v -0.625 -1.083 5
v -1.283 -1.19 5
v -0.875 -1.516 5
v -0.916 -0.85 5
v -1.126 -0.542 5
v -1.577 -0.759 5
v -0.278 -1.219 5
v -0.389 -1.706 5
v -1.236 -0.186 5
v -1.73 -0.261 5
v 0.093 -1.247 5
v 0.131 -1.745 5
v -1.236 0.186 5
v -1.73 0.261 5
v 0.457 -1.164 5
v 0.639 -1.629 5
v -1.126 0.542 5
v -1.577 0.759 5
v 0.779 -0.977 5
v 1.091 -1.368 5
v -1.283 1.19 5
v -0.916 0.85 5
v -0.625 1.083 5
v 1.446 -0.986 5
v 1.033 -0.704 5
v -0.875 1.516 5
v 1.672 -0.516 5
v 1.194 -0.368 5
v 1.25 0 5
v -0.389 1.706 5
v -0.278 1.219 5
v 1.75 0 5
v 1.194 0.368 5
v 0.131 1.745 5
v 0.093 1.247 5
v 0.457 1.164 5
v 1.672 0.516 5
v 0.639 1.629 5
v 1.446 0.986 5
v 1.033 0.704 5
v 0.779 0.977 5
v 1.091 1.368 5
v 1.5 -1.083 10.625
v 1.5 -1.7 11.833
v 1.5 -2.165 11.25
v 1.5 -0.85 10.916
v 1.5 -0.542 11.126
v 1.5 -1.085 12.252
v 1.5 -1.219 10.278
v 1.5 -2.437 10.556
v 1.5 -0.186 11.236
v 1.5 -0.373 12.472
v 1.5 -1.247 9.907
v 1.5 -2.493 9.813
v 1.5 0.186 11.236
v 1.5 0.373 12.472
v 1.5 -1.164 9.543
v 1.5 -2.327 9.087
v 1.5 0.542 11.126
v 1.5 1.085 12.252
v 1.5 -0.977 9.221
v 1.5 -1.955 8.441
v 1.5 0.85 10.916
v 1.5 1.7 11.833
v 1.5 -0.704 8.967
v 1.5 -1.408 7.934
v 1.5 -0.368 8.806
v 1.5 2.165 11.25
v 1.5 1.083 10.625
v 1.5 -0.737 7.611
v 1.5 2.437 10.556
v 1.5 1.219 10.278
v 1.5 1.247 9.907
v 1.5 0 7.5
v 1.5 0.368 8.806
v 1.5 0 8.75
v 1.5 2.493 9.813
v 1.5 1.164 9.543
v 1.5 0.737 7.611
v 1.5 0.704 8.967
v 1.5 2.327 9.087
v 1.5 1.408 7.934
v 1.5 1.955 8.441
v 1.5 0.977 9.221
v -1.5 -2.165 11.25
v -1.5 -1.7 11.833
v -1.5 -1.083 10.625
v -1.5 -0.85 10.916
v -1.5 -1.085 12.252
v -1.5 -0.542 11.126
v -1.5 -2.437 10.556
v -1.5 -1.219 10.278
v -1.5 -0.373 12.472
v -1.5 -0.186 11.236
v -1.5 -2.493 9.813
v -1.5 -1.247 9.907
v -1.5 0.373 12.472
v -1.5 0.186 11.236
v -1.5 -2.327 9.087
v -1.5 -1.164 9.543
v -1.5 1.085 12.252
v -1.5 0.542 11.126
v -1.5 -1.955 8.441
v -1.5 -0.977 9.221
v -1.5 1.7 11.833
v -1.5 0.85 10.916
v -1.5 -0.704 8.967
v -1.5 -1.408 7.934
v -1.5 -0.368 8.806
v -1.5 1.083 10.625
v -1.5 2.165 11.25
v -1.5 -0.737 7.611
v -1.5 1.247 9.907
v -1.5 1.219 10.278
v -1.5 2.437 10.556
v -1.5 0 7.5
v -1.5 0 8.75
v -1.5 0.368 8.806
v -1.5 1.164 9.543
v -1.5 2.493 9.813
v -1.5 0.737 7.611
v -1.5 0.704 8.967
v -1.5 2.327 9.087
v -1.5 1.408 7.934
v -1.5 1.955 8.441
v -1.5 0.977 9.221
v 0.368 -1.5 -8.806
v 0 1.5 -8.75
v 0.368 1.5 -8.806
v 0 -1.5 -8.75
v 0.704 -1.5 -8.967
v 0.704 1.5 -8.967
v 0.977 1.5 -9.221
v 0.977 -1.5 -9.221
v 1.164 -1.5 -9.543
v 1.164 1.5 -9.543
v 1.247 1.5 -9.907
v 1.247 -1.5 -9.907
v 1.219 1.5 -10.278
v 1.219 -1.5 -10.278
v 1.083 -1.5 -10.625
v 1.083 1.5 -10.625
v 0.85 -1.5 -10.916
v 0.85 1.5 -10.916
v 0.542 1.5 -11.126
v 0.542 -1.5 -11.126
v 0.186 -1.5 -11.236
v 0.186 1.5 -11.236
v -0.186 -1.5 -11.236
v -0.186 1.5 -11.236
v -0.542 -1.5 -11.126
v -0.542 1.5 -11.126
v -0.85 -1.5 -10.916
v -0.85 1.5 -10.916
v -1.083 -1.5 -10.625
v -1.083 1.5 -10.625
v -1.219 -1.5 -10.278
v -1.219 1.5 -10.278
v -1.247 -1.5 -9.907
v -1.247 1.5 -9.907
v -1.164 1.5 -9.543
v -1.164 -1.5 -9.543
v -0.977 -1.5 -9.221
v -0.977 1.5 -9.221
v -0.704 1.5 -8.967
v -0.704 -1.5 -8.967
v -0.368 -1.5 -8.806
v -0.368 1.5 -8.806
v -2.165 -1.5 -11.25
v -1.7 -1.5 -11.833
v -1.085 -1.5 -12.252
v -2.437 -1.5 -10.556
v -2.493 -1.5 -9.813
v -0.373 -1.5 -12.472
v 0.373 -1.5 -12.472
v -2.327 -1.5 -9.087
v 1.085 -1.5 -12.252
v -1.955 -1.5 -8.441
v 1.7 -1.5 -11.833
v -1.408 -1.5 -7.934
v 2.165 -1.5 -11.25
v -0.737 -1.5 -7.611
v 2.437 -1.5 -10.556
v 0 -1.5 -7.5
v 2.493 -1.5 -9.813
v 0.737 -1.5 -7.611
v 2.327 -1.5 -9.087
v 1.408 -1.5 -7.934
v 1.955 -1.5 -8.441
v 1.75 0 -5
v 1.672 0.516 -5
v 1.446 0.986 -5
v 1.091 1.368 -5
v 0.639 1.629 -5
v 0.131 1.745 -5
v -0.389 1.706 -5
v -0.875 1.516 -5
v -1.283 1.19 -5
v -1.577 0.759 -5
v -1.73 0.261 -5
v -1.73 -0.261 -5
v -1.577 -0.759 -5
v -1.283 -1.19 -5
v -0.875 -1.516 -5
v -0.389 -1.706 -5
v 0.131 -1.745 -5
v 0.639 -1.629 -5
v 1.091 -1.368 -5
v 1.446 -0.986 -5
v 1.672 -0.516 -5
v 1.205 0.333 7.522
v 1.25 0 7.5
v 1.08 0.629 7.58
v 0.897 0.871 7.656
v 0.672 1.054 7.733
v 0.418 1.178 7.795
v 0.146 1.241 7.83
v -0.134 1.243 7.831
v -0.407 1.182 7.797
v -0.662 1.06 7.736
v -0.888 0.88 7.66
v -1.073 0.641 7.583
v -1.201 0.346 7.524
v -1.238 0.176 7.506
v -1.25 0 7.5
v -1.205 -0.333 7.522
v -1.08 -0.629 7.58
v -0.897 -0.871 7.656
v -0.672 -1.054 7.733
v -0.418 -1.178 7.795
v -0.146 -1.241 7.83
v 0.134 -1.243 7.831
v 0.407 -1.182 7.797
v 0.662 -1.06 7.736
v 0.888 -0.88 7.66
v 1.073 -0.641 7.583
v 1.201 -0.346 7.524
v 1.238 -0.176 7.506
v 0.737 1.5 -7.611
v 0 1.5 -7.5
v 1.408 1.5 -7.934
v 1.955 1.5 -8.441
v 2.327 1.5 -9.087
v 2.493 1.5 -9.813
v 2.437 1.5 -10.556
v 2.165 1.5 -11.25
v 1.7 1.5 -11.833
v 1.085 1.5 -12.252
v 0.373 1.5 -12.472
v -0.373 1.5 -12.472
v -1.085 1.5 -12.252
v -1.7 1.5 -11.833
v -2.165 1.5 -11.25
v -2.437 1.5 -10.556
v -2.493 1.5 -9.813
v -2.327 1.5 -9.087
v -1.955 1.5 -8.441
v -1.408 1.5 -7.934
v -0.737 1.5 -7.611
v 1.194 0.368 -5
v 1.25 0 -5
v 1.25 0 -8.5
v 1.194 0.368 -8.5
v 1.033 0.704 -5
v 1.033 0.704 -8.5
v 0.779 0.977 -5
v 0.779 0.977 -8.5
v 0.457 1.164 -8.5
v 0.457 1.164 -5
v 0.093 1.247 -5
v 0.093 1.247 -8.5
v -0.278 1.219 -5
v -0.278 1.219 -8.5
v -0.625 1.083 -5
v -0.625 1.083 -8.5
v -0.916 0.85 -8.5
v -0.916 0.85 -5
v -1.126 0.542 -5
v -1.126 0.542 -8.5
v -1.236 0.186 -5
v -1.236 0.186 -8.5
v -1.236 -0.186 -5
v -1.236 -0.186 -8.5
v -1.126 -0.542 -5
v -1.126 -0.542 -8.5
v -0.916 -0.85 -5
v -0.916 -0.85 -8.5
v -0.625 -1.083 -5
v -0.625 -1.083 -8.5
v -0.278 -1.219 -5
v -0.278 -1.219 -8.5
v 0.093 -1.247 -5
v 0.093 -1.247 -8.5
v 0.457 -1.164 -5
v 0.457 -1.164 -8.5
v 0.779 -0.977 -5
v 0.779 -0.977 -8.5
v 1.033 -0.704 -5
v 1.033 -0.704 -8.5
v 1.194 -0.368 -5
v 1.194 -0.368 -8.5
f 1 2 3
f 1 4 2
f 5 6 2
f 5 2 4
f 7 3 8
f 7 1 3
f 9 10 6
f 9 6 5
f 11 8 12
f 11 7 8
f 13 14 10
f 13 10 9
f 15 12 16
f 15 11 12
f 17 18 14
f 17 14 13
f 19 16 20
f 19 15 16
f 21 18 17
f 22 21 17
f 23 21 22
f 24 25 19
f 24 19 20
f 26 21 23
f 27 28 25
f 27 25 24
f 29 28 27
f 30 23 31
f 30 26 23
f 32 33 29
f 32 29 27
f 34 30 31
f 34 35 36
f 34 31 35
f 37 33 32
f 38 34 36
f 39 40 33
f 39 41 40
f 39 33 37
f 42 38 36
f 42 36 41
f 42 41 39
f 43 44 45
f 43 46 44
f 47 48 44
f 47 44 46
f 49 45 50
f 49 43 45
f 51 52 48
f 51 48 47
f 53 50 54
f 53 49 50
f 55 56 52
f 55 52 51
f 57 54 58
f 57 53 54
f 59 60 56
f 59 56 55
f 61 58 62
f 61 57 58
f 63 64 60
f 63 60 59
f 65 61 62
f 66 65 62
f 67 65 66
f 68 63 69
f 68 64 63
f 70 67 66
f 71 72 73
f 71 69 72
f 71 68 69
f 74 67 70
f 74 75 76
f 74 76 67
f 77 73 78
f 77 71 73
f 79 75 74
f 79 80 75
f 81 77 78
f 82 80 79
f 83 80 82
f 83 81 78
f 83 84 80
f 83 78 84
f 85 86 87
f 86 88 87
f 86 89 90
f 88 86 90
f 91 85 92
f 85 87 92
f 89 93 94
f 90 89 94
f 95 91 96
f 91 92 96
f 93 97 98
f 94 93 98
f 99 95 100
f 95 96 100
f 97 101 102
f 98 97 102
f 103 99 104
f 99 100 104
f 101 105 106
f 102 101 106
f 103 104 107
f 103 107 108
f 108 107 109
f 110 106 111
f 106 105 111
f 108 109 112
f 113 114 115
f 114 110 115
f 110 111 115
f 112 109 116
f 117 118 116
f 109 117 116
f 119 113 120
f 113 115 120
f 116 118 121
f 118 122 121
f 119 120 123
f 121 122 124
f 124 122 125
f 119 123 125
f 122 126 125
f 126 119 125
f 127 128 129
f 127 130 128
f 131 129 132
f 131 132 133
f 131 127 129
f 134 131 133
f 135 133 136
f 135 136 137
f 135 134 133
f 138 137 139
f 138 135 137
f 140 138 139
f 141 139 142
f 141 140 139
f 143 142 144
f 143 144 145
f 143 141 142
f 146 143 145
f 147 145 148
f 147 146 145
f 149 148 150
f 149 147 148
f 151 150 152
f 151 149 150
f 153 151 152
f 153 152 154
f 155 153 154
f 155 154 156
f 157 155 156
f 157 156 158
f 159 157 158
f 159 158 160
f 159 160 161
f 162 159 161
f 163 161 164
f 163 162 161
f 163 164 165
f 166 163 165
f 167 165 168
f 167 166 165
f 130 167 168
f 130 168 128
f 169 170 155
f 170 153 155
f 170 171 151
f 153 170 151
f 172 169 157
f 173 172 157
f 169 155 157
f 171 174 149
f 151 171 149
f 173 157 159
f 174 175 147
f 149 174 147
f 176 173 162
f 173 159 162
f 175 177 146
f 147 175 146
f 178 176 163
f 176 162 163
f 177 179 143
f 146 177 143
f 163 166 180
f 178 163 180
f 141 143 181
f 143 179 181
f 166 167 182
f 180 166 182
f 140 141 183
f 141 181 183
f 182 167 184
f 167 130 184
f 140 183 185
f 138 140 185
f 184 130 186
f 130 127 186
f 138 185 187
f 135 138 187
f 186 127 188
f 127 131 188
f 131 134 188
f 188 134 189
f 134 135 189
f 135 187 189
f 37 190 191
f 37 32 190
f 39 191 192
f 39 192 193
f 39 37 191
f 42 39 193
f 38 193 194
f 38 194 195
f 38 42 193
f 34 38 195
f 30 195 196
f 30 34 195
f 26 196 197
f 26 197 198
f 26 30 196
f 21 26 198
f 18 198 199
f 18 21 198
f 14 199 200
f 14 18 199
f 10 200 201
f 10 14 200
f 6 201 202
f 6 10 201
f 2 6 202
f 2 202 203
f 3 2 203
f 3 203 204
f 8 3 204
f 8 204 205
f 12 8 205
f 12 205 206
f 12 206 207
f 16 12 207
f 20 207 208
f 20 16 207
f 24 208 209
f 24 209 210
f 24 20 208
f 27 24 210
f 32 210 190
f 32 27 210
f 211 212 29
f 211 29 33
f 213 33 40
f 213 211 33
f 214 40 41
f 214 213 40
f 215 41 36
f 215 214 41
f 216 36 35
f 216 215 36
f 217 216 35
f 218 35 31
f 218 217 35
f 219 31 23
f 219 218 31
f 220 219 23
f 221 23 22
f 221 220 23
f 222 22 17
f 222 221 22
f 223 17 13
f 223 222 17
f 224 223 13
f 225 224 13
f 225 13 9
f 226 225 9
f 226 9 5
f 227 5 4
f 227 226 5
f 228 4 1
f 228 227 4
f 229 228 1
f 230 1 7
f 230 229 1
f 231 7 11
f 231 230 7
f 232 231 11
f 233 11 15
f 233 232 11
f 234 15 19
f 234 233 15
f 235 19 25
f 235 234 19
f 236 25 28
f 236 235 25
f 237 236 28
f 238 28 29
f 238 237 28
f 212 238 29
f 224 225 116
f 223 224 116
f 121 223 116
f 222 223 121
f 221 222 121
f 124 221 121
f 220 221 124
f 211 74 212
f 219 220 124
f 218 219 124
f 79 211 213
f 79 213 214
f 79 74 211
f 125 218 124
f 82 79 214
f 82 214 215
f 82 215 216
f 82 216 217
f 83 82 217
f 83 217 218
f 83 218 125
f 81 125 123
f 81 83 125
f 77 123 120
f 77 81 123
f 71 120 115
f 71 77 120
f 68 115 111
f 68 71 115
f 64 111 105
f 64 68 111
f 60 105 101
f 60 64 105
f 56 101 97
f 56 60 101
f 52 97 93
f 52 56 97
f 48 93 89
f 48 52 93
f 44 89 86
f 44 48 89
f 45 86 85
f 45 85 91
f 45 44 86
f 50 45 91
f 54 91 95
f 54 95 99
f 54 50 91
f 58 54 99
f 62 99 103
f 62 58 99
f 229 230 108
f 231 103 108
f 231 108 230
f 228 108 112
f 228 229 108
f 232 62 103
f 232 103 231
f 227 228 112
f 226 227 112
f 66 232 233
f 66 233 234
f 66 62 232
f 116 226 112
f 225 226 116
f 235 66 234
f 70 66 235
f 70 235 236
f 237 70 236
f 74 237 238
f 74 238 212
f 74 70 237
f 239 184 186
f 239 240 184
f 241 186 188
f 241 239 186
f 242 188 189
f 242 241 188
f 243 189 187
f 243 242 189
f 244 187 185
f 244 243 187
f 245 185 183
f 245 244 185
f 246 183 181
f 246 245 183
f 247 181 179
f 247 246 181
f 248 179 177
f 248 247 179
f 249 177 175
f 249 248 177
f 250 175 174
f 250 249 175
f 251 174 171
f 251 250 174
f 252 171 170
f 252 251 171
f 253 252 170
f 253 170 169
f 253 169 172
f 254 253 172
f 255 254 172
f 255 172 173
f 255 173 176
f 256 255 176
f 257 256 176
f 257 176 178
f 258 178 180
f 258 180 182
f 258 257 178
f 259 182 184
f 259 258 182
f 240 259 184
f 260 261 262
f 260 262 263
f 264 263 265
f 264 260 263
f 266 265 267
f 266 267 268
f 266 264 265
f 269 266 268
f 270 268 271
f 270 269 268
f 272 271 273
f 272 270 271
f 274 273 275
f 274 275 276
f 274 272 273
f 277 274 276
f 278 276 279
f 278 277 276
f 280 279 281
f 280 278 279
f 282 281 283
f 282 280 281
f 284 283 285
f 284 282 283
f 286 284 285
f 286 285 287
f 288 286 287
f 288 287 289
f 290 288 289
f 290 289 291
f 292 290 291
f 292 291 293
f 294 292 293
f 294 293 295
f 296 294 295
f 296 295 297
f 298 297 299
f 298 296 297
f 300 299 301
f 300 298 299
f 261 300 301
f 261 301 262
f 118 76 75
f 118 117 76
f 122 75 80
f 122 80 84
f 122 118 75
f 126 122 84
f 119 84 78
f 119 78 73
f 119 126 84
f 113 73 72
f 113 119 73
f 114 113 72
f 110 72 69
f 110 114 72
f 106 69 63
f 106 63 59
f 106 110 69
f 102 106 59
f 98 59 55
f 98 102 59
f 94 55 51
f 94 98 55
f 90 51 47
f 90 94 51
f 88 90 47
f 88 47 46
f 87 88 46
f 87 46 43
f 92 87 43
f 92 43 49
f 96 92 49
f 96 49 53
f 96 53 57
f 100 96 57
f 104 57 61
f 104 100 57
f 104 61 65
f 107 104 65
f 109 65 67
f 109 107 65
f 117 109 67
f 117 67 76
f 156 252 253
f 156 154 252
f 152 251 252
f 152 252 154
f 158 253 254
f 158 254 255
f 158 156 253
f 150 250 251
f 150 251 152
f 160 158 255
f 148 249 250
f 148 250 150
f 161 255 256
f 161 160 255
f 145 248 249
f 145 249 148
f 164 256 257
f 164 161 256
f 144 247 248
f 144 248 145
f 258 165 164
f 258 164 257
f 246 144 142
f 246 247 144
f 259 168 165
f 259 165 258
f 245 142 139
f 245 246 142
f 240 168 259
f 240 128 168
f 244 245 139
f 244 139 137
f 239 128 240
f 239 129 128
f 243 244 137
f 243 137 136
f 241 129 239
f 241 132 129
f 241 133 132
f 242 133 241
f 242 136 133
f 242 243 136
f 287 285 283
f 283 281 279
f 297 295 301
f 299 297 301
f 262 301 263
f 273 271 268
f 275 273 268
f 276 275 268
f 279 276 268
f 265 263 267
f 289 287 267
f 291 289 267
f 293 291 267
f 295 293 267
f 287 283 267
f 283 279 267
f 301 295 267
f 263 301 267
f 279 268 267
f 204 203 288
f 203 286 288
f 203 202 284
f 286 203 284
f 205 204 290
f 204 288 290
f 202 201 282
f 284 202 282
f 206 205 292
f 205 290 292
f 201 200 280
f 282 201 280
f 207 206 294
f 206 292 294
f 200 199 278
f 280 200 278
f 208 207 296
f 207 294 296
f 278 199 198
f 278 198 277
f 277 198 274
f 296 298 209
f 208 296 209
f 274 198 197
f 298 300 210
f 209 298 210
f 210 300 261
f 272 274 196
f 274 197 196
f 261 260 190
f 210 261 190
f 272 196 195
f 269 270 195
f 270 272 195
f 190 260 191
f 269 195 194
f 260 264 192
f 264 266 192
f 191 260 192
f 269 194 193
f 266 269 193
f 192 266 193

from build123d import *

# Parameters (mm, degrees)
SKETCH2_R           = 1.75
BOSS_EXTRUDE1_DEPTH = 5
SKETCH3_R           = 1.25
BOSS_EXTRUDE2_DEPTH = 8.5
SKETCH4_R           = 2.5
SKETCH4_R_2         = 1.25
BOSS_EXTRUDE3_DEPTH = 1.5
SKETCH5_R           = 2.5
SKETCH5_R_2         = 1.25
BOSS_EXTRUDE4_DEPTH = 1.5


with BuildPart() as part:
    # Sketch2 → Boss-Extrude1 (new, symmetric)
    with BuildSketch(Plane.XY):
        Circle(SKETCH2_R)
    extrude(amount=BOSS_EXTRUDE1_DEPTH, both=True)

    # Sketch3 → Boss-Extrude2 (add, symmetric)
    with BuildSketch(Plane.XY):
        Circle(SKETCH3_R)
    extrude(amount=BOSS_EXTRUDE2_DEPTH, both=True)

    # Sketch5 → Boss-Extrude4 (add, symmetric)
    with BuildSketch(Plane(origin=(0, 0, 0), x_dir=(0, 0, -1), z_dir=(1, 0, 0))):
        with Locations((-10, 0)):
            Circle(SKETCH5_R)
        with Locations((-10, 0)):
            Circle(SKETCH5_R_2, mode=Mode.SUBTRACT)
    extrude(amount=BOSS_EXTRUDE4_DEPTH, both=True)


with BuildPart() as body_2:
    # Sketch4 → Boss-Extrude3 (new, symmetric)
    with BuildSketch(Plane(origin=(0, 0, 0), x_dir=(1, 0, 0), z_dir=(0, 1, 0))):
        with Locations(Location((0, 10, 0), (0, 0, 270))):
            Circle(SKETCH4_R)
        with Locations(Location((0, 10, 0), (0, 0, 270))):
            Circle(SKETCH4_R_2, mode=Mode.SUBTRACT)
    extrude(amount=BOSS_EXTRUDE3_DEPTH, both=True)


solid = Compound([part.part, body_2.part])
